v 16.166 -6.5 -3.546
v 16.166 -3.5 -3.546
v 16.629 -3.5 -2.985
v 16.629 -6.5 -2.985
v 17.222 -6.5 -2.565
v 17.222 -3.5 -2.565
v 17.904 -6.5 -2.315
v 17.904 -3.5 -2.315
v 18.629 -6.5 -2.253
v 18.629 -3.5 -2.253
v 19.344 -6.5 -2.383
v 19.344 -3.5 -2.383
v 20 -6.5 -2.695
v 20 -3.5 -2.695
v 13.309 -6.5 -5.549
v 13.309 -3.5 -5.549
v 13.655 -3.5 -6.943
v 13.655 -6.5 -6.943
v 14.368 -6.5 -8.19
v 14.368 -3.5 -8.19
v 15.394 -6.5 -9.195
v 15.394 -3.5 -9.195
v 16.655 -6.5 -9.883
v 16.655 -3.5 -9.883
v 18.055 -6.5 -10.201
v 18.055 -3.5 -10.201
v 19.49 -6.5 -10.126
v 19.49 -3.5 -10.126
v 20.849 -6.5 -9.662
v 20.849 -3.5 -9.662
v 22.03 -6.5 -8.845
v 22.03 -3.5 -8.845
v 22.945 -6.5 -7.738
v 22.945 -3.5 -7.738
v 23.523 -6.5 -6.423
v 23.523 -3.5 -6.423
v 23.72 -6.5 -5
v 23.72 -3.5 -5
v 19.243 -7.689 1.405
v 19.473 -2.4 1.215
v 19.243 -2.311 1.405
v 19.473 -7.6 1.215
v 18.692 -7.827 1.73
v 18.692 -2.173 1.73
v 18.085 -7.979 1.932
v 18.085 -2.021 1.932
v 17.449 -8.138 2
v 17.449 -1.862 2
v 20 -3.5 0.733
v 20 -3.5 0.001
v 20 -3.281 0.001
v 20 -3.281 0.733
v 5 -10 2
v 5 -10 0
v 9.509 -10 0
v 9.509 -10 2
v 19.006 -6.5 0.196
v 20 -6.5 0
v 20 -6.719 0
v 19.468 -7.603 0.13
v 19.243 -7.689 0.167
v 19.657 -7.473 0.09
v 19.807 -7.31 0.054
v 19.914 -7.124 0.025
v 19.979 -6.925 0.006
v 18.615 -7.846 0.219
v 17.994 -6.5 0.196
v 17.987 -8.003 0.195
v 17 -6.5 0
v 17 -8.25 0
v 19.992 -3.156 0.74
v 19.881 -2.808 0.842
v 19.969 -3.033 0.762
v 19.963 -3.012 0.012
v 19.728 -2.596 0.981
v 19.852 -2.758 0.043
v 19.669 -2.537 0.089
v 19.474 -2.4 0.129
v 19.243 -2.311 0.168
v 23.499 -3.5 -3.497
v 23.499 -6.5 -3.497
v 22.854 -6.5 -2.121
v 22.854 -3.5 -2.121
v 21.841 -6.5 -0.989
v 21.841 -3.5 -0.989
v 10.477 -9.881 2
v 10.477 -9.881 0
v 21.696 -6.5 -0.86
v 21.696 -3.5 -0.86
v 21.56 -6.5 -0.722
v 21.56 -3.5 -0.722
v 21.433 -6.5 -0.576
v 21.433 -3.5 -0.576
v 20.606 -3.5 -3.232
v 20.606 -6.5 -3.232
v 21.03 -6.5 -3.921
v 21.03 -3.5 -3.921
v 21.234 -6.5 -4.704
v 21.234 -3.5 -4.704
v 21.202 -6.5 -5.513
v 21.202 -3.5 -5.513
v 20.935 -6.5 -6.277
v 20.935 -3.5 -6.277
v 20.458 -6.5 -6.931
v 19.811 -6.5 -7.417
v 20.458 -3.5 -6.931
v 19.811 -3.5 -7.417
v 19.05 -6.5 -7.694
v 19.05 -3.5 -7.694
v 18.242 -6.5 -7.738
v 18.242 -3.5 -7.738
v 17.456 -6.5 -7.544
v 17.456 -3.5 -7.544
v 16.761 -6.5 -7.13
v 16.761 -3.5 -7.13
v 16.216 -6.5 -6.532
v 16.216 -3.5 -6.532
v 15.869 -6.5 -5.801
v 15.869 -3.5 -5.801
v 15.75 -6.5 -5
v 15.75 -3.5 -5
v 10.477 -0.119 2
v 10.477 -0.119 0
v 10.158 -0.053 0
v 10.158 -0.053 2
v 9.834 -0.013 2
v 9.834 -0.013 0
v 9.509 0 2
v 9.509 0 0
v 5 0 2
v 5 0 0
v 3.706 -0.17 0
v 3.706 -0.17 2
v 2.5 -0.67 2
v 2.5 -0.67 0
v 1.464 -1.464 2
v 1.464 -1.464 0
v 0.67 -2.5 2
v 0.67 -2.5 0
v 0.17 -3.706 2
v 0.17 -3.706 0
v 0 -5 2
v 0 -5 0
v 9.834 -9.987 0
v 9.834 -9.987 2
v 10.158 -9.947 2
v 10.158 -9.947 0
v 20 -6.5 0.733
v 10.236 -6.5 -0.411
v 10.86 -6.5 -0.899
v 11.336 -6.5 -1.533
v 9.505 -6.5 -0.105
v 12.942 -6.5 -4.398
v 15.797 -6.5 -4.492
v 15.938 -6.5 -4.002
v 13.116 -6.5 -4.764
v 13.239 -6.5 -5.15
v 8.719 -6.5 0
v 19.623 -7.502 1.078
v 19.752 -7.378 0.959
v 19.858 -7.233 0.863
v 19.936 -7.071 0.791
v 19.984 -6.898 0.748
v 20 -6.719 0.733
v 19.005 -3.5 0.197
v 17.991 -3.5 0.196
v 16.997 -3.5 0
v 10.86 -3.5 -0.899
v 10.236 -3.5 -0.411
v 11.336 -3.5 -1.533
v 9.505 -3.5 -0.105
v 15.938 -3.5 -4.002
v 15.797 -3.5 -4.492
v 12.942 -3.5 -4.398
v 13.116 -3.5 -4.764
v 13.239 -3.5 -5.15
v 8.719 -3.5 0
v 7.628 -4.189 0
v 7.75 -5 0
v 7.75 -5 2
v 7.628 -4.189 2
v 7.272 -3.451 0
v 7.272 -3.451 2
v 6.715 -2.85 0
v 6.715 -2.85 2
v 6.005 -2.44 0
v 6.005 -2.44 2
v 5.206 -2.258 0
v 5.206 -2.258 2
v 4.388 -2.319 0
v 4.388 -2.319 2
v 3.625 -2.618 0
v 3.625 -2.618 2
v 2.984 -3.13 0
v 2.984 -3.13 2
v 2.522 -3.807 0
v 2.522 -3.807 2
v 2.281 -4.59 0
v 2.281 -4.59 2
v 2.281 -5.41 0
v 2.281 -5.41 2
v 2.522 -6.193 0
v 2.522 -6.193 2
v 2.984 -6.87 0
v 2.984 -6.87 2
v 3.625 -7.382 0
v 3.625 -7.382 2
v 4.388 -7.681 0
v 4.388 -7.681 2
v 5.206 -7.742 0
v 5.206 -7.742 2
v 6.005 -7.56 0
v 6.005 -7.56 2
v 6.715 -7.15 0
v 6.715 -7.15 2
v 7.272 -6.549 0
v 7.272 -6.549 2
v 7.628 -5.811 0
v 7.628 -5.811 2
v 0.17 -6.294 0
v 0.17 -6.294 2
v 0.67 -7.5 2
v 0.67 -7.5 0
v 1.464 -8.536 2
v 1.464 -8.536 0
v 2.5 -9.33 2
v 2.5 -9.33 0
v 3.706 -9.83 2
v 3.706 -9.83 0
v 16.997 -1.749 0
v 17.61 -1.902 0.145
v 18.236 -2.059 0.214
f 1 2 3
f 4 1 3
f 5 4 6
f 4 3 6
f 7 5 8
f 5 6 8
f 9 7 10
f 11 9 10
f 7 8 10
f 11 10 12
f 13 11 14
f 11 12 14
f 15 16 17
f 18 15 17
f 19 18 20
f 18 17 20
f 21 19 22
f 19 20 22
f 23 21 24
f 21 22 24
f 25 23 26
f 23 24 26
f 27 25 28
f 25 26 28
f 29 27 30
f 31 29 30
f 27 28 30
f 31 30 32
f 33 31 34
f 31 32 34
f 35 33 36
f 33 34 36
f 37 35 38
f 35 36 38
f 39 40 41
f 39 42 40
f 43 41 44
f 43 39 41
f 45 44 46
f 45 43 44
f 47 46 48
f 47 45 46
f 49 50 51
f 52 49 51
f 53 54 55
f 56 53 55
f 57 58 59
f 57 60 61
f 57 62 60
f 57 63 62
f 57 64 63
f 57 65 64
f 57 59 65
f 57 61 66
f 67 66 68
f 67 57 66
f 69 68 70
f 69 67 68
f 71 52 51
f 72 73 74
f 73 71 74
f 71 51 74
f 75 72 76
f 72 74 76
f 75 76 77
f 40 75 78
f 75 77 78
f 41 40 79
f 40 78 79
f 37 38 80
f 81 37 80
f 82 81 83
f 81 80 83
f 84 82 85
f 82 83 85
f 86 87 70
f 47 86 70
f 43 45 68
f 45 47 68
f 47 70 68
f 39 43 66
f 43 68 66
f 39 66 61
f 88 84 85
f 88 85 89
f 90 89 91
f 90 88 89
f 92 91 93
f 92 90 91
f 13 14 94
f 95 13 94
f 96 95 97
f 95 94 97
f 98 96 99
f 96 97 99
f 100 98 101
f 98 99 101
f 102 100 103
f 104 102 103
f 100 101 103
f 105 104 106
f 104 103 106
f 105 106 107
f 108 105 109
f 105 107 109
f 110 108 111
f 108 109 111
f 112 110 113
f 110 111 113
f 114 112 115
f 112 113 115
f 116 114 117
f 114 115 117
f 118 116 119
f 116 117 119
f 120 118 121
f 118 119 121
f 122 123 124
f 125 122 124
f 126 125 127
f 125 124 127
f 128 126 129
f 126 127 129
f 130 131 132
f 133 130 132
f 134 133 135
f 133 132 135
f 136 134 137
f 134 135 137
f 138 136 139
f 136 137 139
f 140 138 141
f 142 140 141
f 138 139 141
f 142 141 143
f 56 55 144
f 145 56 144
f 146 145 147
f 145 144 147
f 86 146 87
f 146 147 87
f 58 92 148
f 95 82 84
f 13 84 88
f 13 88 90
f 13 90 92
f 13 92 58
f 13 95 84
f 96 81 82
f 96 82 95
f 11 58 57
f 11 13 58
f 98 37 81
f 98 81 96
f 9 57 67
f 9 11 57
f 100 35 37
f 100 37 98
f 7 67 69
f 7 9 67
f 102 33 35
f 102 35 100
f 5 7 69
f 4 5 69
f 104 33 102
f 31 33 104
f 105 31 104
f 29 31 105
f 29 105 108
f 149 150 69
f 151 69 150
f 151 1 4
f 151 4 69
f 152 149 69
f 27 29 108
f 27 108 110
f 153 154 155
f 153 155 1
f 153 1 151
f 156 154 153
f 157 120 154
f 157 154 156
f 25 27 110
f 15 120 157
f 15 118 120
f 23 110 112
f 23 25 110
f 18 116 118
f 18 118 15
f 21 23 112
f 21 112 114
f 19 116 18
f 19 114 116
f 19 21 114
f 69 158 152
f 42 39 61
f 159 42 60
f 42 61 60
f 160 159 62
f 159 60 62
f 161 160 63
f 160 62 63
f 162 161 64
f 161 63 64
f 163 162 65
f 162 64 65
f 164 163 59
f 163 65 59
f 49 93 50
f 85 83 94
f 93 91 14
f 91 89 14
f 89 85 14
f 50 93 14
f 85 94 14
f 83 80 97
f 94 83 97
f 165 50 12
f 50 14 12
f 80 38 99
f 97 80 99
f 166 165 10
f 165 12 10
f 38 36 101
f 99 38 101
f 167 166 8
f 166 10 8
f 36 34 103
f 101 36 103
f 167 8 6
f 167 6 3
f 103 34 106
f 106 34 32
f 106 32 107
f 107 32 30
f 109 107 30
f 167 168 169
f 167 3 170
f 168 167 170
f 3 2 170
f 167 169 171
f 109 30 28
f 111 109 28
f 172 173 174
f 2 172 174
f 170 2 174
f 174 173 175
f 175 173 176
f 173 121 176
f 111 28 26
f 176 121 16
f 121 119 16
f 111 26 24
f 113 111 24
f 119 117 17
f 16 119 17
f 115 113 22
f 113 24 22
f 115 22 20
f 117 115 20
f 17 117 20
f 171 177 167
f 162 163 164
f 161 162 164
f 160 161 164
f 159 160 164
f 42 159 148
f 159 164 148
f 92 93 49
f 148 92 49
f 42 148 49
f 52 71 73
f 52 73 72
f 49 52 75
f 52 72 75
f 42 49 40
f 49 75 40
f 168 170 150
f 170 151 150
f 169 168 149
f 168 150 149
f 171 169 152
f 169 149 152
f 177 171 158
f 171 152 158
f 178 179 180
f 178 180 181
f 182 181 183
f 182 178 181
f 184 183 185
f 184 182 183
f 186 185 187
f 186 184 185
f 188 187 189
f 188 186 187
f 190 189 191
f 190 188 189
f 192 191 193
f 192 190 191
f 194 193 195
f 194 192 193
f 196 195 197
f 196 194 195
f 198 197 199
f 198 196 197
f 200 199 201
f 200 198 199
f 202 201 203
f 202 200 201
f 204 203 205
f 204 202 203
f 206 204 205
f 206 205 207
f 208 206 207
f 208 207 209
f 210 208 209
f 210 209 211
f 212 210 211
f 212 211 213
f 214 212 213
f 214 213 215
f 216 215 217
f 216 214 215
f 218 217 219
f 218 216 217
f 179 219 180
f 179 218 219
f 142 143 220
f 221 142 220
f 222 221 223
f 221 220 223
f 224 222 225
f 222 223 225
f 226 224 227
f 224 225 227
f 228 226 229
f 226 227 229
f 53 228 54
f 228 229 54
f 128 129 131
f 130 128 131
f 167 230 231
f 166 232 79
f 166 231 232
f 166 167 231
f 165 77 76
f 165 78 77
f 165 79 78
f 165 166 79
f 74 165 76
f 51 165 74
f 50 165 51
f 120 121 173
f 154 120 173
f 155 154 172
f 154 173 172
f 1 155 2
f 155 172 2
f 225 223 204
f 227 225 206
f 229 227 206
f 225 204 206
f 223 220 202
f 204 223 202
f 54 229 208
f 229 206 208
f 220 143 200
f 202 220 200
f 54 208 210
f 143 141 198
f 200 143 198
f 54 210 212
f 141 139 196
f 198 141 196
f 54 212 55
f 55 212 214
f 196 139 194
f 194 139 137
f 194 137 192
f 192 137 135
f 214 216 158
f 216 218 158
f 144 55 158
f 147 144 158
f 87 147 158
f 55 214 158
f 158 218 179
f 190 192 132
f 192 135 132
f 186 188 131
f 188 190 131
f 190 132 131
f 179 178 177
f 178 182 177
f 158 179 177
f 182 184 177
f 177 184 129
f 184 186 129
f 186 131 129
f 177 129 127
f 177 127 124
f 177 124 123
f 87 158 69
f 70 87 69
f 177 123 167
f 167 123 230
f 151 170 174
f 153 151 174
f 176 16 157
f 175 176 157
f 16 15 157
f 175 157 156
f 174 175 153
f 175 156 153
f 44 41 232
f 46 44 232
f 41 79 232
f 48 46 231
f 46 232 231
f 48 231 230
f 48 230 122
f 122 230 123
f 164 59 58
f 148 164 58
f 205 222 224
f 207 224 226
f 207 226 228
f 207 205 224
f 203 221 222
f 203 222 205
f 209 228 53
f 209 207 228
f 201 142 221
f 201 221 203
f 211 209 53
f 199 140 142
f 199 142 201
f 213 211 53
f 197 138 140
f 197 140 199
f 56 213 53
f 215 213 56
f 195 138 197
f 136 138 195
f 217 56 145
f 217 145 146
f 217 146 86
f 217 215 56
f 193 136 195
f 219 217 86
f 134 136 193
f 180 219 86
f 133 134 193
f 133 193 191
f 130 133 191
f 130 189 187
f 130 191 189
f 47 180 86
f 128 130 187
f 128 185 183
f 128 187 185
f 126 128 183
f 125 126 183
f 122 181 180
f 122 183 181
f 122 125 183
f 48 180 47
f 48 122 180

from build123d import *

# Parameters (mm, degrees)
SKETCH1_R                = 2.75
BOSS_EXTRUDE1_DEPTH      = 2
BOSS_EXTRUDE2_DEPTH      = 2.5
BOSS_EXTRUDE2_DEPTH_BACK = 0.5
FILLET1_R                = 3
CUT_EXTRUDE1_DEPTH       = 4.9
CUT_EXTRUDE1_DEPTH_BACK  = 3.5
FILLET2_R                = 3
SKETCH5_R                = 5.220153254
CUT_EXTRUDE2_DEPTH       = 3.5
SKETCH6_R                = 5.221148533
CUT_EXTRUDE3_DEPTH       = 3.5


with BuildPart() as part:
    # Sketch1 → Boss-Extrude1 (new body)
    with BuildSketch(Plane.XY):
        with BuildLine():
            Line((9.508808554, 0), (5, 0))
            ThreePointArc((5, 0), (1.464466094, -1.464466094), (0, -5))
            ThreePointArc((0, -5), (1.464466094, -8.535533906), (5, -10))
            Line((5, -10), (9.508808554, -10))
            ThreePointArc((9.508808554, -10), (9.996319776, -9.970105151), (10.476525698, -9.880868576))
            Line((10.476525698, -9.880868576), (19.242535625, -7.689366094))
            ThreePointArc((19.242535625, -7.689366094), (19.788205438, -7.334635803), (20, -6.719223594))
            Line((20, -6.719223594), (20, -4.609611797))
            Line((20, -4.609611797), (20, -3.280776406))
            ThreePointArc((20, -3.280776406), (19.788205438, -2.665364197), (19.242535625, -2.310633906))
            Line((19.242535625, -2.310633906), (10.476525698, -0.119131424))
            ThreePointArc((10.476525698, -0.119131424), (9.996319776, -0.029894849), (9.508808554, 0))
        make_face()
        with Locations((5, -5)):
            Circle(SKETCH1_R, mode=Mode.SUBTRACT)
    extrude(amount=BOSS_EXTRUDE1_DEPTH)

    # Sketch3 → Boss-Extrude2 (add, two sides: drawn at the far end of the back side and taken through both)
    with BuildSketch(Plane(origin=(0, -4, 0), x_dir=(-1, 0, 0), z_dir=(0, -1, 0)).offset(-BOSS_EXTRUDE2_DEPTH_BACK)):
        with BuildLine():
            ThreePointArc((-23.720153254, 5), (-23.109616483, 2.550217177), (-21.420820041, 0.673475957))
            Line((-21.420820041, 0.673475957), (-23.720153254, 5))
        make_face()
        with BuildLine():
            ThreePointArc((-21.420820041, 0.673475957), (-20.735912548, 0.282935757), (-20, 0))
            Line((-20, 0), (-20, 2.695113886))
            ThreePointArc((-20, 2.695113886), (-19.81101106, 7.417384951), (-15.75, 5))
            ThreePointArc((-15.75, 5), (-15.856067672, 4.243612637), (-16.166088613, 3.54557309))
            Line((-16.166088613, 3.54557309), (-14.069681773, 2.23915223))
            ThreePointArc((-14.069681773, 2.23915223), (-13.481188382, 3.564197108), (-13.279846746, 5))
            ThreePointArc((-13.279846746, 5), (-18.5, 10.220153254), (-23.720153254, 5))
            Line((-23.720153254, 5), (-21.420820041, 0.673475957))
        make_face()
        with BuildLine():
            Line((-20, 2.695113886), (-20, 0))
            ThreePointArc((-20, 0), (-16.65605263, 0.11636835), (-14.069681773, 2.23915223))
            Line((-14.069681773, 2.23915223), (-16.166088613, 3.54557309))
            ThreePointArc((-16.166088613, 3.54557309), (-17.904456328, 2.315260211), (-20, 2.695113886))
        make_face()
        with BuildLine():
            ThreePointArc((-13.279846746, 5), (-13.481188382, 3.564197108), (-14.069681773, 2.23915223))
            Line((-14.069681773, 2.23915223), (-10.476525698, 0))
            Line((-10.476525698, 0), (-13.279846746, 5))
        make_face()
        with BuildLine():
            ThreePointArc((-14.069681773, 2.23915223), (-16.65605263, 0.11636835), (-20, 0))
            ThreePointArc((-20, 0), (-20.735912548, 0.282935757), (-21.420820041, 0.673475957))
            Line((-21.420820041, 0.673475957), (-20, -2))
            Line((-20, -2), (-10.476525698, 0))
            Line((-10.476525698, 0), (-14.069681773, 2.23915223))
        make_face()
    extrude(amount=BOSS_EXTRUDE2_DEPTH + BOSS_EXTRUDE2_DEPTH_BACK)

    # Fillet1
    fillet1_edges = [part.edges().sort_by_distance(p)[0] for p in [
        (10.476525698, -5, 0),
        (21.420820041, -5, -0.673475957),
        (13.279846746, -5, -5),
    ]]
    fillet(fillet1_edges, radius=FILLET1_R)

    # Sketch4 → Cut-Extrude1 (cut, two sides: drawn at the far end of the back side and taken through both)
    with BuildSketch(Plane(origin=(0, -4, 0), x_dir=(-1, 0, 0), z_dir=(0, -1, 0)).offset(-CUT_EXTRUDE1_DEPTH_BACK)):
        Polygon((-21.432511864, 0.575653333), (-18.613235122, -2), (-20, -2), align=None)
    extrude(amount=CUT_EXTRUDE1_DEPTH + CUT_EXTRUDE1_DEPTH_BACK, mode=Mode.SUBTRACT)

    # Fillet2
    fillet2_edges = [part.edges().sort_by_distance(p)[0] for p in [
        (18.613235122, -5, 2),
    ]]
    fillet(fillet2_edges, radius=FILLET2_R)

    # Sketch5 → Cut-Extrude2 (cut)
    with BuildSketch(Plane.XZ.offset(6.5)):
        with Locations((18.5, -5)):
            Circle(SKETCH5_R)
    extrude(amount=CUT_EXTRUDE2_DEPTH, mode=Mode.SUBTRACT)

    # Sketch6 → Cut-Extrude3 (cut)
    with BuildSketch(Plane(origin=(0, -3.5, 0), x_dir=(1, 0, 0), z_dir=(0, 1, 0))):
        with Locations((18.5, 5)):
            Circle(SKETCH6_R)
    extrude(amount=CUT_EXTRUDE3_DEPTH, mode=Mode.SUBTRACT)


solid = part.part
